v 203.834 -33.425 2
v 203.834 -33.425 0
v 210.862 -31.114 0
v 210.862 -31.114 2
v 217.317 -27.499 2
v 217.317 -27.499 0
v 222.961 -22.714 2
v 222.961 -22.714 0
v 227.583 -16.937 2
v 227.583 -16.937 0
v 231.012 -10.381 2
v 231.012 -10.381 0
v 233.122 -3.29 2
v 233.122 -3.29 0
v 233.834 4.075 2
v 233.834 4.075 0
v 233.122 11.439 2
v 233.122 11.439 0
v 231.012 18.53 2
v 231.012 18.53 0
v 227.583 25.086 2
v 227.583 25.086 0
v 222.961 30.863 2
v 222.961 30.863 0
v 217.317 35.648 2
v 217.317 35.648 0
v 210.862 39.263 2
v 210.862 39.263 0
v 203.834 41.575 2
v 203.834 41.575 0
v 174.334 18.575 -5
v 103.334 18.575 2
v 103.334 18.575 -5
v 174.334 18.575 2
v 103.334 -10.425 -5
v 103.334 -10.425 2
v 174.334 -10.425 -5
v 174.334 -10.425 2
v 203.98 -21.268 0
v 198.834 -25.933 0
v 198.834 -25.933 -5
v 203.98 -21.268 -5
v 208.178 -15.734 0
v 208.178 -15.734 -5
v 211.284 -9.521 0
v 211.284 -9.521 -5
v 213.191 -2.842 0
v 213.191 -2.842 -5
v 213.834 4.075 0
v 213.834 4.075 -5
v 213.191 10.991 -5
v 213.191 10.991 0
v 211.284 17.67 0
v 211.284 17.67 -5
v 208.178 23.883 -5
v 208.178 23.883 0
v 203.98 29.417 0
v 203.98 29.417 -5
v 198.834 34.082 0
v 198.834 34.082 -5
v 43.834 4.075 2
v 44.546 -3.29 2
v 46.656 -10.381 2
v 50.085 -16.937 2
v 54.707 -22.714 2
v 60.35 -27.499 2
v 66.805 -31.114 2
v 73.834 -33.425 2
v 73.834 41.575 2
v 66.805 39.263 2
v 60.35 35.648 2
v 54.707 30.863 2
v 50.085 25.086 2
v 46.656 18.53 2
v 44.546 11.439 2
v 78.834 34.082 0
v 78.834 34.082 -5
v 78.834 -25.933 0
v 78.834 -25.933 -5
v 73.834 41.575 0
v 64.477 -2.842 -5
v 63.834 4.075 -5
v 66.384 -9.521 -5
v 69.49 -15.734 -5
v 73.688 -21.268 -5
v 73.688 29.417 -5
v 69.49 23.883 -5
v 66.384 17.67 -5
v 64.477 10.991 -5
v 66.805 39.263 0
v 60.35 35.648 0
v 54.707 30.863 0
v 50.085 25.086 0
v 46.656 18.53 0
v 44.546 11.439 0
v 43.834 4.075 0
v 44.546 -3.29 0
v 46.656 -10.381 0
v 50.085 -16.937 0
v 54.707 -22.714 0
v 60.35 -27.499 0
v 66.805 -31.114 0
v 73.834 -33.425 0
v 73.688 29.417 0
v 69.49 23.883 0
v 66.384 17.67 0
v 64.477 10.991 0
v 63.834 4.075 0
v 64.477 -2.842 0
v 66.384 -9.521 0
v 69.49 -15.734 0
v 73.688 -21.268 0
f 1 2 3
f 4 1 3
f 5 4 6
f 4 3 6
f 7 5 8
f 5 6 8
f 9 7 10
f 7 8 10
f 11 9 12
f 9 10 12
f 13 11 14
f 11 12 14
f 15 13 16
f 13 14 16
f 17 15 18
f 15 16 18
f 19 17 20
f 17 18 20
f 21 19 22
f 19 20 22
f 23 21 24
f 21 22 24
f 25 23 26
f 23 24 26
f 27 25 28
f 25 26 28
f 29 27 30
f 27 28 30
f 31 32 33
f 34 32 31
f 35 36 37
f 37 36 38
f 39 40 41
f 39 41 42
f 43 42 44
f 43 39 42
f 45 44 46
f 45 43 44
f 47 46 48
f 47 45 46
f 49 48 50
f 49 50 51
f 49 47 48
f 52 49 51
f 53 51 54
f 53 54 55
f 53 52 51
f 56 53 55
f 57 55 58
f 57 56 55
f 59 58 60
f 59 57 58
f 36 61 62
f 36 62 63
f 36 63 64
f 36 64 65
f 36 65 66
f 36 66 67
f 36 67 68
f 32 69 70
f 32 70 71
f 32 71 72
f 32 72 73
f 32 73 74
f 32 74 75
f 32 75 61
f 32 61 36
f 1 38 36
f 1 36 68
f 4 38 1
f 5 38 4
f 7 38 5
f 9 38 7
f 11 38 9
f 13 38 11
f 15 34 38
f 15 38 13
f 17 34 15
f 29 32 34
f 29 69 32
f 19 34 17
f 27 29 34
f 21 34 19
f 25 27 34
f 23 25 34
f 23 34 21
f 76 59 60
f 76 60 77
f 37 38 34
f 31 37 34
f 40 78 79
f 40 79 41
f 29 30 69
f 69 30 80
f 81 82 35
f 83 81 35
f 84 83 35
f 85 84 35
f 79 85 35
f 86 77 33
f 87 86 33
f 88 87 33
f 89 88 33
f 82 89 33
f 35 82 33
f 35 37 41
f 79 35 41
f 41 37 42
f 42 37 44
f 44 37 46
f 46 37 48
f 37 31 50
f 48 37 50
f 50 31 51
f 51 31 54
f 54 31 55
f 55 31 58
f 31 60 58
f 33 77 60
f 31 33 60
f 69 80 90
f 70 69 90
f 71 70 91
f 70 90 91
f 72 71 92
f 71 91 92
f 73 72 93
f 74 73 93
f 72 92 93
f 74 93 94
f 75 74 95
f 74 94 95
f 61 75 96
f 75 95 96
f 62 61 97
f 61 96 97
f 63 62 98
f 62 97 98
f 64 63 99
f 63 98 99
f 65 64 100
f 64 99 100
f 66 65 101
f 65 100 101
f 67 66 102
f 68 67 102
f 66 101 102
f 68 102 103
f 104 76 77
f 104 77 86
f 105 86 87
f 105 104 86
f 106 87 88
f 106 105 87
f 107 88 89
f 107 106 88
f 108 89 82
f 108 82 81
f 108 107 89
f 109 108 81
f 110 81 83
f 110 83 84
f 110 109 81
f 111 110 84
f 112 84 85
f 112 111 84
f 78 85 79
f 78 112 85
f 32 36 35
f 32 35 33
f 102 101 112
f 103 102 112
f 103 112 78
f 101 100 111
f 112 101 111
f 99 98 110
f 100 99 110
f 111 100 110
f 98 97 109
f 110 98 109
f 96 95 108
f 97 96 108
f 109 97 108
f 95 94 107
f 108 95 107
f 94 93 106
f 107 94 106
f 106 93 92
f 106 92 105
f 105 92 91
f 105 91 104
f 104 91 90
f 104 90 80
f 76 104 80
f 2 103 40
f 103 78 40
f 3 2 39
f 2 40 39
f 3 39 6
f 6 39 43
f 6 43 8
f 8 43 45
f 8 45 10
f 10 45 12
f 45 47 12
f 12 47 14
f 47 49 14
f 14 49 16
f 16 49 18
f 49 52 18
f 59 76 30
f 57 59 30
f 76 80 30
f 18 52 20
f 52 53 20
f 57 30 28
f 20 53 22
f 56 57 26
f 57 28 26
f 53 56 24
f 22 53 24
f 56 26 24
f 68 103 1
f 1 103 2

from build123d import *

# Parameters (mm, degrees)
F0_DEPTH = 2
F3_DEPTH = 5
F1_W     = 71
F1_H     = 29
F4_DEPTH = 7


with BuildPart() as f0:
    # F5 (on Top) → F0 (new body)
    with BuildSketch(Plane.XY):
        with BuildLine():
            Line((203.833783, 41.574535), (73.833783, 41.574535))
            ThreePointArc((73.833783, 41.574535), (43.833783, 4.074535), (73.833783, -33.425465))
            Line((73.833783, -33.425465), (203.833783, -33.425465))
            ThreePointArc((203.833783, -33.425465), (233.833783, 4.074535), (203.833783, 41.574535))
        make_face()
    extrude(amount=F0_DEPTH)

    # F2 (on face) → F3 (join)
    with BuildSketch(Plane.XY):
        with BuildLine():
            ThreePointArc((78.833783, 34.081681), (63.833783, 4.074535), (78.833783, -25.932611))
            Line((78.833783, -25.932611), (198.833783, -25.932611))
            ThreePointArc((198.833783, -25.932611), (213.833783, 4.074535), (198.833783, 34.081681))
            Line((198.833783, 34.081681), (78.833783, 34.081681))
        make_face()
    extrude(amount=-F3_DEPTH)

    # F1 (on face) → F4 (cut, through all)
    with BuildSketch(Plane.XY.offset(2)):
        with Locations((138.833783, 4.074535)):
            Rectangle(F1_W, F1_H)
    extrude(amount=-F4_DEPTH, mode=Mode.SUBTRACT)


solid = f0.part
